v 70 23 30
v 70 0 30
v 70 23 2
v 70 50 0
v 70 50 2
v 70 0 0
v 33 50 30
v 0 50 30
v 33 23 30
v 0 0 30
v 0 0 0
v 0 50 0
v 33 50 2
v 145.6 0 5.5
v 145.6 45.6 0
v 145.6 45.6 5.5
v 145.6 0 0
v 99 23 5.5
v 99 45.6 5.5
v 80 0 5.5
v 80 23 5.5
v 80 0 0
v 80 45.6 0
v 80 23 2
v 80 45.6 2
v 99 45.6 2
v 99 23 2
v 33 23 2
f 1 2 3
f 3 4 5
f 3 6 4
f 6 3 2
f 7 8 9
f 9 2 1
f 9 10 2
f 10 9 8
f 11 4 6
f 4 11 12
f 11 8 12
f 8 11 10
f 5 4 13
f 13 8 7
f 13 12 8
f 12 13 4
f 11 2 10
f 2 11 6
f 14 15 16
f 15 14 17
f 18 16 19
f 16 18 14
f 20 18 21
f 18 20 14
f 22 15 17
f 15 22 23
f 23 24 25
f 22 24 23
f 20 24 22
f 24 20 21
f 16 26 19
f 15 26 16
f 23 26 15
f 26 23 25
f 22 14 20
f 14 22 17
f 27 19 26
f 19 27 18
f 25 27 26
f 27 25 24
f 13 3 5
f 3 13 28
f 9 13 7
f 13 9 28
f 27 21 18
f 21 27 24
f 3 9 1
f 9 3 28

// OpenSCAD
// Two-part enclosure for small electronics board
// Print orientation: box standing on bed (z = 0), lid on top, printed upside down

// ---------------- Parameters ----------------
box_x      = 70;    // box outer length (X)
box_y      = 50;    // box outer width (Y)
box_z      = 30;    // box outer height (Z)
box_wall   = 2;     // box wall thickness
box_floor  = 2;     // box floor thickness

gap        = 10;    // gap between box and lid

lip_x      = 65.6;  // lid lip outer length (X)
lip_y      = 45.6;  // lid lip outer width (Y)
lip_t      = 1.5;   // lid lip thickness
lip_h      = 4;     // lid lip height

eps        = 0.5;   // cutter overshoot

$fn = 64;

// ---------------- Derived ----------------
box_inner_x = box_x - 2 * box_wall;
box_inner_y = box_y - 2 * box_wall;
box_inner_z = box_z - box_floor;   // open-top cavity height

// ---------------- Model ----------------
difference() {
    union() {
        // Box body (includes floor, open top)
        cube([box_x, box_y, box_z]);

        // Lid: plate + lip, printed upside down (lip on top)
        translate([box_x + gap, 0, 0])
            cube([lip_x, lip_y, lip_t + lip_h]);
    }

    // Open-top cavity cutter (extends above top face)
    translate([box_inner_x / 2, box_inner_y / 2, box_floor])
        cube([box_inner_x, box_inner_y, box_inner_z + eps]);
}
